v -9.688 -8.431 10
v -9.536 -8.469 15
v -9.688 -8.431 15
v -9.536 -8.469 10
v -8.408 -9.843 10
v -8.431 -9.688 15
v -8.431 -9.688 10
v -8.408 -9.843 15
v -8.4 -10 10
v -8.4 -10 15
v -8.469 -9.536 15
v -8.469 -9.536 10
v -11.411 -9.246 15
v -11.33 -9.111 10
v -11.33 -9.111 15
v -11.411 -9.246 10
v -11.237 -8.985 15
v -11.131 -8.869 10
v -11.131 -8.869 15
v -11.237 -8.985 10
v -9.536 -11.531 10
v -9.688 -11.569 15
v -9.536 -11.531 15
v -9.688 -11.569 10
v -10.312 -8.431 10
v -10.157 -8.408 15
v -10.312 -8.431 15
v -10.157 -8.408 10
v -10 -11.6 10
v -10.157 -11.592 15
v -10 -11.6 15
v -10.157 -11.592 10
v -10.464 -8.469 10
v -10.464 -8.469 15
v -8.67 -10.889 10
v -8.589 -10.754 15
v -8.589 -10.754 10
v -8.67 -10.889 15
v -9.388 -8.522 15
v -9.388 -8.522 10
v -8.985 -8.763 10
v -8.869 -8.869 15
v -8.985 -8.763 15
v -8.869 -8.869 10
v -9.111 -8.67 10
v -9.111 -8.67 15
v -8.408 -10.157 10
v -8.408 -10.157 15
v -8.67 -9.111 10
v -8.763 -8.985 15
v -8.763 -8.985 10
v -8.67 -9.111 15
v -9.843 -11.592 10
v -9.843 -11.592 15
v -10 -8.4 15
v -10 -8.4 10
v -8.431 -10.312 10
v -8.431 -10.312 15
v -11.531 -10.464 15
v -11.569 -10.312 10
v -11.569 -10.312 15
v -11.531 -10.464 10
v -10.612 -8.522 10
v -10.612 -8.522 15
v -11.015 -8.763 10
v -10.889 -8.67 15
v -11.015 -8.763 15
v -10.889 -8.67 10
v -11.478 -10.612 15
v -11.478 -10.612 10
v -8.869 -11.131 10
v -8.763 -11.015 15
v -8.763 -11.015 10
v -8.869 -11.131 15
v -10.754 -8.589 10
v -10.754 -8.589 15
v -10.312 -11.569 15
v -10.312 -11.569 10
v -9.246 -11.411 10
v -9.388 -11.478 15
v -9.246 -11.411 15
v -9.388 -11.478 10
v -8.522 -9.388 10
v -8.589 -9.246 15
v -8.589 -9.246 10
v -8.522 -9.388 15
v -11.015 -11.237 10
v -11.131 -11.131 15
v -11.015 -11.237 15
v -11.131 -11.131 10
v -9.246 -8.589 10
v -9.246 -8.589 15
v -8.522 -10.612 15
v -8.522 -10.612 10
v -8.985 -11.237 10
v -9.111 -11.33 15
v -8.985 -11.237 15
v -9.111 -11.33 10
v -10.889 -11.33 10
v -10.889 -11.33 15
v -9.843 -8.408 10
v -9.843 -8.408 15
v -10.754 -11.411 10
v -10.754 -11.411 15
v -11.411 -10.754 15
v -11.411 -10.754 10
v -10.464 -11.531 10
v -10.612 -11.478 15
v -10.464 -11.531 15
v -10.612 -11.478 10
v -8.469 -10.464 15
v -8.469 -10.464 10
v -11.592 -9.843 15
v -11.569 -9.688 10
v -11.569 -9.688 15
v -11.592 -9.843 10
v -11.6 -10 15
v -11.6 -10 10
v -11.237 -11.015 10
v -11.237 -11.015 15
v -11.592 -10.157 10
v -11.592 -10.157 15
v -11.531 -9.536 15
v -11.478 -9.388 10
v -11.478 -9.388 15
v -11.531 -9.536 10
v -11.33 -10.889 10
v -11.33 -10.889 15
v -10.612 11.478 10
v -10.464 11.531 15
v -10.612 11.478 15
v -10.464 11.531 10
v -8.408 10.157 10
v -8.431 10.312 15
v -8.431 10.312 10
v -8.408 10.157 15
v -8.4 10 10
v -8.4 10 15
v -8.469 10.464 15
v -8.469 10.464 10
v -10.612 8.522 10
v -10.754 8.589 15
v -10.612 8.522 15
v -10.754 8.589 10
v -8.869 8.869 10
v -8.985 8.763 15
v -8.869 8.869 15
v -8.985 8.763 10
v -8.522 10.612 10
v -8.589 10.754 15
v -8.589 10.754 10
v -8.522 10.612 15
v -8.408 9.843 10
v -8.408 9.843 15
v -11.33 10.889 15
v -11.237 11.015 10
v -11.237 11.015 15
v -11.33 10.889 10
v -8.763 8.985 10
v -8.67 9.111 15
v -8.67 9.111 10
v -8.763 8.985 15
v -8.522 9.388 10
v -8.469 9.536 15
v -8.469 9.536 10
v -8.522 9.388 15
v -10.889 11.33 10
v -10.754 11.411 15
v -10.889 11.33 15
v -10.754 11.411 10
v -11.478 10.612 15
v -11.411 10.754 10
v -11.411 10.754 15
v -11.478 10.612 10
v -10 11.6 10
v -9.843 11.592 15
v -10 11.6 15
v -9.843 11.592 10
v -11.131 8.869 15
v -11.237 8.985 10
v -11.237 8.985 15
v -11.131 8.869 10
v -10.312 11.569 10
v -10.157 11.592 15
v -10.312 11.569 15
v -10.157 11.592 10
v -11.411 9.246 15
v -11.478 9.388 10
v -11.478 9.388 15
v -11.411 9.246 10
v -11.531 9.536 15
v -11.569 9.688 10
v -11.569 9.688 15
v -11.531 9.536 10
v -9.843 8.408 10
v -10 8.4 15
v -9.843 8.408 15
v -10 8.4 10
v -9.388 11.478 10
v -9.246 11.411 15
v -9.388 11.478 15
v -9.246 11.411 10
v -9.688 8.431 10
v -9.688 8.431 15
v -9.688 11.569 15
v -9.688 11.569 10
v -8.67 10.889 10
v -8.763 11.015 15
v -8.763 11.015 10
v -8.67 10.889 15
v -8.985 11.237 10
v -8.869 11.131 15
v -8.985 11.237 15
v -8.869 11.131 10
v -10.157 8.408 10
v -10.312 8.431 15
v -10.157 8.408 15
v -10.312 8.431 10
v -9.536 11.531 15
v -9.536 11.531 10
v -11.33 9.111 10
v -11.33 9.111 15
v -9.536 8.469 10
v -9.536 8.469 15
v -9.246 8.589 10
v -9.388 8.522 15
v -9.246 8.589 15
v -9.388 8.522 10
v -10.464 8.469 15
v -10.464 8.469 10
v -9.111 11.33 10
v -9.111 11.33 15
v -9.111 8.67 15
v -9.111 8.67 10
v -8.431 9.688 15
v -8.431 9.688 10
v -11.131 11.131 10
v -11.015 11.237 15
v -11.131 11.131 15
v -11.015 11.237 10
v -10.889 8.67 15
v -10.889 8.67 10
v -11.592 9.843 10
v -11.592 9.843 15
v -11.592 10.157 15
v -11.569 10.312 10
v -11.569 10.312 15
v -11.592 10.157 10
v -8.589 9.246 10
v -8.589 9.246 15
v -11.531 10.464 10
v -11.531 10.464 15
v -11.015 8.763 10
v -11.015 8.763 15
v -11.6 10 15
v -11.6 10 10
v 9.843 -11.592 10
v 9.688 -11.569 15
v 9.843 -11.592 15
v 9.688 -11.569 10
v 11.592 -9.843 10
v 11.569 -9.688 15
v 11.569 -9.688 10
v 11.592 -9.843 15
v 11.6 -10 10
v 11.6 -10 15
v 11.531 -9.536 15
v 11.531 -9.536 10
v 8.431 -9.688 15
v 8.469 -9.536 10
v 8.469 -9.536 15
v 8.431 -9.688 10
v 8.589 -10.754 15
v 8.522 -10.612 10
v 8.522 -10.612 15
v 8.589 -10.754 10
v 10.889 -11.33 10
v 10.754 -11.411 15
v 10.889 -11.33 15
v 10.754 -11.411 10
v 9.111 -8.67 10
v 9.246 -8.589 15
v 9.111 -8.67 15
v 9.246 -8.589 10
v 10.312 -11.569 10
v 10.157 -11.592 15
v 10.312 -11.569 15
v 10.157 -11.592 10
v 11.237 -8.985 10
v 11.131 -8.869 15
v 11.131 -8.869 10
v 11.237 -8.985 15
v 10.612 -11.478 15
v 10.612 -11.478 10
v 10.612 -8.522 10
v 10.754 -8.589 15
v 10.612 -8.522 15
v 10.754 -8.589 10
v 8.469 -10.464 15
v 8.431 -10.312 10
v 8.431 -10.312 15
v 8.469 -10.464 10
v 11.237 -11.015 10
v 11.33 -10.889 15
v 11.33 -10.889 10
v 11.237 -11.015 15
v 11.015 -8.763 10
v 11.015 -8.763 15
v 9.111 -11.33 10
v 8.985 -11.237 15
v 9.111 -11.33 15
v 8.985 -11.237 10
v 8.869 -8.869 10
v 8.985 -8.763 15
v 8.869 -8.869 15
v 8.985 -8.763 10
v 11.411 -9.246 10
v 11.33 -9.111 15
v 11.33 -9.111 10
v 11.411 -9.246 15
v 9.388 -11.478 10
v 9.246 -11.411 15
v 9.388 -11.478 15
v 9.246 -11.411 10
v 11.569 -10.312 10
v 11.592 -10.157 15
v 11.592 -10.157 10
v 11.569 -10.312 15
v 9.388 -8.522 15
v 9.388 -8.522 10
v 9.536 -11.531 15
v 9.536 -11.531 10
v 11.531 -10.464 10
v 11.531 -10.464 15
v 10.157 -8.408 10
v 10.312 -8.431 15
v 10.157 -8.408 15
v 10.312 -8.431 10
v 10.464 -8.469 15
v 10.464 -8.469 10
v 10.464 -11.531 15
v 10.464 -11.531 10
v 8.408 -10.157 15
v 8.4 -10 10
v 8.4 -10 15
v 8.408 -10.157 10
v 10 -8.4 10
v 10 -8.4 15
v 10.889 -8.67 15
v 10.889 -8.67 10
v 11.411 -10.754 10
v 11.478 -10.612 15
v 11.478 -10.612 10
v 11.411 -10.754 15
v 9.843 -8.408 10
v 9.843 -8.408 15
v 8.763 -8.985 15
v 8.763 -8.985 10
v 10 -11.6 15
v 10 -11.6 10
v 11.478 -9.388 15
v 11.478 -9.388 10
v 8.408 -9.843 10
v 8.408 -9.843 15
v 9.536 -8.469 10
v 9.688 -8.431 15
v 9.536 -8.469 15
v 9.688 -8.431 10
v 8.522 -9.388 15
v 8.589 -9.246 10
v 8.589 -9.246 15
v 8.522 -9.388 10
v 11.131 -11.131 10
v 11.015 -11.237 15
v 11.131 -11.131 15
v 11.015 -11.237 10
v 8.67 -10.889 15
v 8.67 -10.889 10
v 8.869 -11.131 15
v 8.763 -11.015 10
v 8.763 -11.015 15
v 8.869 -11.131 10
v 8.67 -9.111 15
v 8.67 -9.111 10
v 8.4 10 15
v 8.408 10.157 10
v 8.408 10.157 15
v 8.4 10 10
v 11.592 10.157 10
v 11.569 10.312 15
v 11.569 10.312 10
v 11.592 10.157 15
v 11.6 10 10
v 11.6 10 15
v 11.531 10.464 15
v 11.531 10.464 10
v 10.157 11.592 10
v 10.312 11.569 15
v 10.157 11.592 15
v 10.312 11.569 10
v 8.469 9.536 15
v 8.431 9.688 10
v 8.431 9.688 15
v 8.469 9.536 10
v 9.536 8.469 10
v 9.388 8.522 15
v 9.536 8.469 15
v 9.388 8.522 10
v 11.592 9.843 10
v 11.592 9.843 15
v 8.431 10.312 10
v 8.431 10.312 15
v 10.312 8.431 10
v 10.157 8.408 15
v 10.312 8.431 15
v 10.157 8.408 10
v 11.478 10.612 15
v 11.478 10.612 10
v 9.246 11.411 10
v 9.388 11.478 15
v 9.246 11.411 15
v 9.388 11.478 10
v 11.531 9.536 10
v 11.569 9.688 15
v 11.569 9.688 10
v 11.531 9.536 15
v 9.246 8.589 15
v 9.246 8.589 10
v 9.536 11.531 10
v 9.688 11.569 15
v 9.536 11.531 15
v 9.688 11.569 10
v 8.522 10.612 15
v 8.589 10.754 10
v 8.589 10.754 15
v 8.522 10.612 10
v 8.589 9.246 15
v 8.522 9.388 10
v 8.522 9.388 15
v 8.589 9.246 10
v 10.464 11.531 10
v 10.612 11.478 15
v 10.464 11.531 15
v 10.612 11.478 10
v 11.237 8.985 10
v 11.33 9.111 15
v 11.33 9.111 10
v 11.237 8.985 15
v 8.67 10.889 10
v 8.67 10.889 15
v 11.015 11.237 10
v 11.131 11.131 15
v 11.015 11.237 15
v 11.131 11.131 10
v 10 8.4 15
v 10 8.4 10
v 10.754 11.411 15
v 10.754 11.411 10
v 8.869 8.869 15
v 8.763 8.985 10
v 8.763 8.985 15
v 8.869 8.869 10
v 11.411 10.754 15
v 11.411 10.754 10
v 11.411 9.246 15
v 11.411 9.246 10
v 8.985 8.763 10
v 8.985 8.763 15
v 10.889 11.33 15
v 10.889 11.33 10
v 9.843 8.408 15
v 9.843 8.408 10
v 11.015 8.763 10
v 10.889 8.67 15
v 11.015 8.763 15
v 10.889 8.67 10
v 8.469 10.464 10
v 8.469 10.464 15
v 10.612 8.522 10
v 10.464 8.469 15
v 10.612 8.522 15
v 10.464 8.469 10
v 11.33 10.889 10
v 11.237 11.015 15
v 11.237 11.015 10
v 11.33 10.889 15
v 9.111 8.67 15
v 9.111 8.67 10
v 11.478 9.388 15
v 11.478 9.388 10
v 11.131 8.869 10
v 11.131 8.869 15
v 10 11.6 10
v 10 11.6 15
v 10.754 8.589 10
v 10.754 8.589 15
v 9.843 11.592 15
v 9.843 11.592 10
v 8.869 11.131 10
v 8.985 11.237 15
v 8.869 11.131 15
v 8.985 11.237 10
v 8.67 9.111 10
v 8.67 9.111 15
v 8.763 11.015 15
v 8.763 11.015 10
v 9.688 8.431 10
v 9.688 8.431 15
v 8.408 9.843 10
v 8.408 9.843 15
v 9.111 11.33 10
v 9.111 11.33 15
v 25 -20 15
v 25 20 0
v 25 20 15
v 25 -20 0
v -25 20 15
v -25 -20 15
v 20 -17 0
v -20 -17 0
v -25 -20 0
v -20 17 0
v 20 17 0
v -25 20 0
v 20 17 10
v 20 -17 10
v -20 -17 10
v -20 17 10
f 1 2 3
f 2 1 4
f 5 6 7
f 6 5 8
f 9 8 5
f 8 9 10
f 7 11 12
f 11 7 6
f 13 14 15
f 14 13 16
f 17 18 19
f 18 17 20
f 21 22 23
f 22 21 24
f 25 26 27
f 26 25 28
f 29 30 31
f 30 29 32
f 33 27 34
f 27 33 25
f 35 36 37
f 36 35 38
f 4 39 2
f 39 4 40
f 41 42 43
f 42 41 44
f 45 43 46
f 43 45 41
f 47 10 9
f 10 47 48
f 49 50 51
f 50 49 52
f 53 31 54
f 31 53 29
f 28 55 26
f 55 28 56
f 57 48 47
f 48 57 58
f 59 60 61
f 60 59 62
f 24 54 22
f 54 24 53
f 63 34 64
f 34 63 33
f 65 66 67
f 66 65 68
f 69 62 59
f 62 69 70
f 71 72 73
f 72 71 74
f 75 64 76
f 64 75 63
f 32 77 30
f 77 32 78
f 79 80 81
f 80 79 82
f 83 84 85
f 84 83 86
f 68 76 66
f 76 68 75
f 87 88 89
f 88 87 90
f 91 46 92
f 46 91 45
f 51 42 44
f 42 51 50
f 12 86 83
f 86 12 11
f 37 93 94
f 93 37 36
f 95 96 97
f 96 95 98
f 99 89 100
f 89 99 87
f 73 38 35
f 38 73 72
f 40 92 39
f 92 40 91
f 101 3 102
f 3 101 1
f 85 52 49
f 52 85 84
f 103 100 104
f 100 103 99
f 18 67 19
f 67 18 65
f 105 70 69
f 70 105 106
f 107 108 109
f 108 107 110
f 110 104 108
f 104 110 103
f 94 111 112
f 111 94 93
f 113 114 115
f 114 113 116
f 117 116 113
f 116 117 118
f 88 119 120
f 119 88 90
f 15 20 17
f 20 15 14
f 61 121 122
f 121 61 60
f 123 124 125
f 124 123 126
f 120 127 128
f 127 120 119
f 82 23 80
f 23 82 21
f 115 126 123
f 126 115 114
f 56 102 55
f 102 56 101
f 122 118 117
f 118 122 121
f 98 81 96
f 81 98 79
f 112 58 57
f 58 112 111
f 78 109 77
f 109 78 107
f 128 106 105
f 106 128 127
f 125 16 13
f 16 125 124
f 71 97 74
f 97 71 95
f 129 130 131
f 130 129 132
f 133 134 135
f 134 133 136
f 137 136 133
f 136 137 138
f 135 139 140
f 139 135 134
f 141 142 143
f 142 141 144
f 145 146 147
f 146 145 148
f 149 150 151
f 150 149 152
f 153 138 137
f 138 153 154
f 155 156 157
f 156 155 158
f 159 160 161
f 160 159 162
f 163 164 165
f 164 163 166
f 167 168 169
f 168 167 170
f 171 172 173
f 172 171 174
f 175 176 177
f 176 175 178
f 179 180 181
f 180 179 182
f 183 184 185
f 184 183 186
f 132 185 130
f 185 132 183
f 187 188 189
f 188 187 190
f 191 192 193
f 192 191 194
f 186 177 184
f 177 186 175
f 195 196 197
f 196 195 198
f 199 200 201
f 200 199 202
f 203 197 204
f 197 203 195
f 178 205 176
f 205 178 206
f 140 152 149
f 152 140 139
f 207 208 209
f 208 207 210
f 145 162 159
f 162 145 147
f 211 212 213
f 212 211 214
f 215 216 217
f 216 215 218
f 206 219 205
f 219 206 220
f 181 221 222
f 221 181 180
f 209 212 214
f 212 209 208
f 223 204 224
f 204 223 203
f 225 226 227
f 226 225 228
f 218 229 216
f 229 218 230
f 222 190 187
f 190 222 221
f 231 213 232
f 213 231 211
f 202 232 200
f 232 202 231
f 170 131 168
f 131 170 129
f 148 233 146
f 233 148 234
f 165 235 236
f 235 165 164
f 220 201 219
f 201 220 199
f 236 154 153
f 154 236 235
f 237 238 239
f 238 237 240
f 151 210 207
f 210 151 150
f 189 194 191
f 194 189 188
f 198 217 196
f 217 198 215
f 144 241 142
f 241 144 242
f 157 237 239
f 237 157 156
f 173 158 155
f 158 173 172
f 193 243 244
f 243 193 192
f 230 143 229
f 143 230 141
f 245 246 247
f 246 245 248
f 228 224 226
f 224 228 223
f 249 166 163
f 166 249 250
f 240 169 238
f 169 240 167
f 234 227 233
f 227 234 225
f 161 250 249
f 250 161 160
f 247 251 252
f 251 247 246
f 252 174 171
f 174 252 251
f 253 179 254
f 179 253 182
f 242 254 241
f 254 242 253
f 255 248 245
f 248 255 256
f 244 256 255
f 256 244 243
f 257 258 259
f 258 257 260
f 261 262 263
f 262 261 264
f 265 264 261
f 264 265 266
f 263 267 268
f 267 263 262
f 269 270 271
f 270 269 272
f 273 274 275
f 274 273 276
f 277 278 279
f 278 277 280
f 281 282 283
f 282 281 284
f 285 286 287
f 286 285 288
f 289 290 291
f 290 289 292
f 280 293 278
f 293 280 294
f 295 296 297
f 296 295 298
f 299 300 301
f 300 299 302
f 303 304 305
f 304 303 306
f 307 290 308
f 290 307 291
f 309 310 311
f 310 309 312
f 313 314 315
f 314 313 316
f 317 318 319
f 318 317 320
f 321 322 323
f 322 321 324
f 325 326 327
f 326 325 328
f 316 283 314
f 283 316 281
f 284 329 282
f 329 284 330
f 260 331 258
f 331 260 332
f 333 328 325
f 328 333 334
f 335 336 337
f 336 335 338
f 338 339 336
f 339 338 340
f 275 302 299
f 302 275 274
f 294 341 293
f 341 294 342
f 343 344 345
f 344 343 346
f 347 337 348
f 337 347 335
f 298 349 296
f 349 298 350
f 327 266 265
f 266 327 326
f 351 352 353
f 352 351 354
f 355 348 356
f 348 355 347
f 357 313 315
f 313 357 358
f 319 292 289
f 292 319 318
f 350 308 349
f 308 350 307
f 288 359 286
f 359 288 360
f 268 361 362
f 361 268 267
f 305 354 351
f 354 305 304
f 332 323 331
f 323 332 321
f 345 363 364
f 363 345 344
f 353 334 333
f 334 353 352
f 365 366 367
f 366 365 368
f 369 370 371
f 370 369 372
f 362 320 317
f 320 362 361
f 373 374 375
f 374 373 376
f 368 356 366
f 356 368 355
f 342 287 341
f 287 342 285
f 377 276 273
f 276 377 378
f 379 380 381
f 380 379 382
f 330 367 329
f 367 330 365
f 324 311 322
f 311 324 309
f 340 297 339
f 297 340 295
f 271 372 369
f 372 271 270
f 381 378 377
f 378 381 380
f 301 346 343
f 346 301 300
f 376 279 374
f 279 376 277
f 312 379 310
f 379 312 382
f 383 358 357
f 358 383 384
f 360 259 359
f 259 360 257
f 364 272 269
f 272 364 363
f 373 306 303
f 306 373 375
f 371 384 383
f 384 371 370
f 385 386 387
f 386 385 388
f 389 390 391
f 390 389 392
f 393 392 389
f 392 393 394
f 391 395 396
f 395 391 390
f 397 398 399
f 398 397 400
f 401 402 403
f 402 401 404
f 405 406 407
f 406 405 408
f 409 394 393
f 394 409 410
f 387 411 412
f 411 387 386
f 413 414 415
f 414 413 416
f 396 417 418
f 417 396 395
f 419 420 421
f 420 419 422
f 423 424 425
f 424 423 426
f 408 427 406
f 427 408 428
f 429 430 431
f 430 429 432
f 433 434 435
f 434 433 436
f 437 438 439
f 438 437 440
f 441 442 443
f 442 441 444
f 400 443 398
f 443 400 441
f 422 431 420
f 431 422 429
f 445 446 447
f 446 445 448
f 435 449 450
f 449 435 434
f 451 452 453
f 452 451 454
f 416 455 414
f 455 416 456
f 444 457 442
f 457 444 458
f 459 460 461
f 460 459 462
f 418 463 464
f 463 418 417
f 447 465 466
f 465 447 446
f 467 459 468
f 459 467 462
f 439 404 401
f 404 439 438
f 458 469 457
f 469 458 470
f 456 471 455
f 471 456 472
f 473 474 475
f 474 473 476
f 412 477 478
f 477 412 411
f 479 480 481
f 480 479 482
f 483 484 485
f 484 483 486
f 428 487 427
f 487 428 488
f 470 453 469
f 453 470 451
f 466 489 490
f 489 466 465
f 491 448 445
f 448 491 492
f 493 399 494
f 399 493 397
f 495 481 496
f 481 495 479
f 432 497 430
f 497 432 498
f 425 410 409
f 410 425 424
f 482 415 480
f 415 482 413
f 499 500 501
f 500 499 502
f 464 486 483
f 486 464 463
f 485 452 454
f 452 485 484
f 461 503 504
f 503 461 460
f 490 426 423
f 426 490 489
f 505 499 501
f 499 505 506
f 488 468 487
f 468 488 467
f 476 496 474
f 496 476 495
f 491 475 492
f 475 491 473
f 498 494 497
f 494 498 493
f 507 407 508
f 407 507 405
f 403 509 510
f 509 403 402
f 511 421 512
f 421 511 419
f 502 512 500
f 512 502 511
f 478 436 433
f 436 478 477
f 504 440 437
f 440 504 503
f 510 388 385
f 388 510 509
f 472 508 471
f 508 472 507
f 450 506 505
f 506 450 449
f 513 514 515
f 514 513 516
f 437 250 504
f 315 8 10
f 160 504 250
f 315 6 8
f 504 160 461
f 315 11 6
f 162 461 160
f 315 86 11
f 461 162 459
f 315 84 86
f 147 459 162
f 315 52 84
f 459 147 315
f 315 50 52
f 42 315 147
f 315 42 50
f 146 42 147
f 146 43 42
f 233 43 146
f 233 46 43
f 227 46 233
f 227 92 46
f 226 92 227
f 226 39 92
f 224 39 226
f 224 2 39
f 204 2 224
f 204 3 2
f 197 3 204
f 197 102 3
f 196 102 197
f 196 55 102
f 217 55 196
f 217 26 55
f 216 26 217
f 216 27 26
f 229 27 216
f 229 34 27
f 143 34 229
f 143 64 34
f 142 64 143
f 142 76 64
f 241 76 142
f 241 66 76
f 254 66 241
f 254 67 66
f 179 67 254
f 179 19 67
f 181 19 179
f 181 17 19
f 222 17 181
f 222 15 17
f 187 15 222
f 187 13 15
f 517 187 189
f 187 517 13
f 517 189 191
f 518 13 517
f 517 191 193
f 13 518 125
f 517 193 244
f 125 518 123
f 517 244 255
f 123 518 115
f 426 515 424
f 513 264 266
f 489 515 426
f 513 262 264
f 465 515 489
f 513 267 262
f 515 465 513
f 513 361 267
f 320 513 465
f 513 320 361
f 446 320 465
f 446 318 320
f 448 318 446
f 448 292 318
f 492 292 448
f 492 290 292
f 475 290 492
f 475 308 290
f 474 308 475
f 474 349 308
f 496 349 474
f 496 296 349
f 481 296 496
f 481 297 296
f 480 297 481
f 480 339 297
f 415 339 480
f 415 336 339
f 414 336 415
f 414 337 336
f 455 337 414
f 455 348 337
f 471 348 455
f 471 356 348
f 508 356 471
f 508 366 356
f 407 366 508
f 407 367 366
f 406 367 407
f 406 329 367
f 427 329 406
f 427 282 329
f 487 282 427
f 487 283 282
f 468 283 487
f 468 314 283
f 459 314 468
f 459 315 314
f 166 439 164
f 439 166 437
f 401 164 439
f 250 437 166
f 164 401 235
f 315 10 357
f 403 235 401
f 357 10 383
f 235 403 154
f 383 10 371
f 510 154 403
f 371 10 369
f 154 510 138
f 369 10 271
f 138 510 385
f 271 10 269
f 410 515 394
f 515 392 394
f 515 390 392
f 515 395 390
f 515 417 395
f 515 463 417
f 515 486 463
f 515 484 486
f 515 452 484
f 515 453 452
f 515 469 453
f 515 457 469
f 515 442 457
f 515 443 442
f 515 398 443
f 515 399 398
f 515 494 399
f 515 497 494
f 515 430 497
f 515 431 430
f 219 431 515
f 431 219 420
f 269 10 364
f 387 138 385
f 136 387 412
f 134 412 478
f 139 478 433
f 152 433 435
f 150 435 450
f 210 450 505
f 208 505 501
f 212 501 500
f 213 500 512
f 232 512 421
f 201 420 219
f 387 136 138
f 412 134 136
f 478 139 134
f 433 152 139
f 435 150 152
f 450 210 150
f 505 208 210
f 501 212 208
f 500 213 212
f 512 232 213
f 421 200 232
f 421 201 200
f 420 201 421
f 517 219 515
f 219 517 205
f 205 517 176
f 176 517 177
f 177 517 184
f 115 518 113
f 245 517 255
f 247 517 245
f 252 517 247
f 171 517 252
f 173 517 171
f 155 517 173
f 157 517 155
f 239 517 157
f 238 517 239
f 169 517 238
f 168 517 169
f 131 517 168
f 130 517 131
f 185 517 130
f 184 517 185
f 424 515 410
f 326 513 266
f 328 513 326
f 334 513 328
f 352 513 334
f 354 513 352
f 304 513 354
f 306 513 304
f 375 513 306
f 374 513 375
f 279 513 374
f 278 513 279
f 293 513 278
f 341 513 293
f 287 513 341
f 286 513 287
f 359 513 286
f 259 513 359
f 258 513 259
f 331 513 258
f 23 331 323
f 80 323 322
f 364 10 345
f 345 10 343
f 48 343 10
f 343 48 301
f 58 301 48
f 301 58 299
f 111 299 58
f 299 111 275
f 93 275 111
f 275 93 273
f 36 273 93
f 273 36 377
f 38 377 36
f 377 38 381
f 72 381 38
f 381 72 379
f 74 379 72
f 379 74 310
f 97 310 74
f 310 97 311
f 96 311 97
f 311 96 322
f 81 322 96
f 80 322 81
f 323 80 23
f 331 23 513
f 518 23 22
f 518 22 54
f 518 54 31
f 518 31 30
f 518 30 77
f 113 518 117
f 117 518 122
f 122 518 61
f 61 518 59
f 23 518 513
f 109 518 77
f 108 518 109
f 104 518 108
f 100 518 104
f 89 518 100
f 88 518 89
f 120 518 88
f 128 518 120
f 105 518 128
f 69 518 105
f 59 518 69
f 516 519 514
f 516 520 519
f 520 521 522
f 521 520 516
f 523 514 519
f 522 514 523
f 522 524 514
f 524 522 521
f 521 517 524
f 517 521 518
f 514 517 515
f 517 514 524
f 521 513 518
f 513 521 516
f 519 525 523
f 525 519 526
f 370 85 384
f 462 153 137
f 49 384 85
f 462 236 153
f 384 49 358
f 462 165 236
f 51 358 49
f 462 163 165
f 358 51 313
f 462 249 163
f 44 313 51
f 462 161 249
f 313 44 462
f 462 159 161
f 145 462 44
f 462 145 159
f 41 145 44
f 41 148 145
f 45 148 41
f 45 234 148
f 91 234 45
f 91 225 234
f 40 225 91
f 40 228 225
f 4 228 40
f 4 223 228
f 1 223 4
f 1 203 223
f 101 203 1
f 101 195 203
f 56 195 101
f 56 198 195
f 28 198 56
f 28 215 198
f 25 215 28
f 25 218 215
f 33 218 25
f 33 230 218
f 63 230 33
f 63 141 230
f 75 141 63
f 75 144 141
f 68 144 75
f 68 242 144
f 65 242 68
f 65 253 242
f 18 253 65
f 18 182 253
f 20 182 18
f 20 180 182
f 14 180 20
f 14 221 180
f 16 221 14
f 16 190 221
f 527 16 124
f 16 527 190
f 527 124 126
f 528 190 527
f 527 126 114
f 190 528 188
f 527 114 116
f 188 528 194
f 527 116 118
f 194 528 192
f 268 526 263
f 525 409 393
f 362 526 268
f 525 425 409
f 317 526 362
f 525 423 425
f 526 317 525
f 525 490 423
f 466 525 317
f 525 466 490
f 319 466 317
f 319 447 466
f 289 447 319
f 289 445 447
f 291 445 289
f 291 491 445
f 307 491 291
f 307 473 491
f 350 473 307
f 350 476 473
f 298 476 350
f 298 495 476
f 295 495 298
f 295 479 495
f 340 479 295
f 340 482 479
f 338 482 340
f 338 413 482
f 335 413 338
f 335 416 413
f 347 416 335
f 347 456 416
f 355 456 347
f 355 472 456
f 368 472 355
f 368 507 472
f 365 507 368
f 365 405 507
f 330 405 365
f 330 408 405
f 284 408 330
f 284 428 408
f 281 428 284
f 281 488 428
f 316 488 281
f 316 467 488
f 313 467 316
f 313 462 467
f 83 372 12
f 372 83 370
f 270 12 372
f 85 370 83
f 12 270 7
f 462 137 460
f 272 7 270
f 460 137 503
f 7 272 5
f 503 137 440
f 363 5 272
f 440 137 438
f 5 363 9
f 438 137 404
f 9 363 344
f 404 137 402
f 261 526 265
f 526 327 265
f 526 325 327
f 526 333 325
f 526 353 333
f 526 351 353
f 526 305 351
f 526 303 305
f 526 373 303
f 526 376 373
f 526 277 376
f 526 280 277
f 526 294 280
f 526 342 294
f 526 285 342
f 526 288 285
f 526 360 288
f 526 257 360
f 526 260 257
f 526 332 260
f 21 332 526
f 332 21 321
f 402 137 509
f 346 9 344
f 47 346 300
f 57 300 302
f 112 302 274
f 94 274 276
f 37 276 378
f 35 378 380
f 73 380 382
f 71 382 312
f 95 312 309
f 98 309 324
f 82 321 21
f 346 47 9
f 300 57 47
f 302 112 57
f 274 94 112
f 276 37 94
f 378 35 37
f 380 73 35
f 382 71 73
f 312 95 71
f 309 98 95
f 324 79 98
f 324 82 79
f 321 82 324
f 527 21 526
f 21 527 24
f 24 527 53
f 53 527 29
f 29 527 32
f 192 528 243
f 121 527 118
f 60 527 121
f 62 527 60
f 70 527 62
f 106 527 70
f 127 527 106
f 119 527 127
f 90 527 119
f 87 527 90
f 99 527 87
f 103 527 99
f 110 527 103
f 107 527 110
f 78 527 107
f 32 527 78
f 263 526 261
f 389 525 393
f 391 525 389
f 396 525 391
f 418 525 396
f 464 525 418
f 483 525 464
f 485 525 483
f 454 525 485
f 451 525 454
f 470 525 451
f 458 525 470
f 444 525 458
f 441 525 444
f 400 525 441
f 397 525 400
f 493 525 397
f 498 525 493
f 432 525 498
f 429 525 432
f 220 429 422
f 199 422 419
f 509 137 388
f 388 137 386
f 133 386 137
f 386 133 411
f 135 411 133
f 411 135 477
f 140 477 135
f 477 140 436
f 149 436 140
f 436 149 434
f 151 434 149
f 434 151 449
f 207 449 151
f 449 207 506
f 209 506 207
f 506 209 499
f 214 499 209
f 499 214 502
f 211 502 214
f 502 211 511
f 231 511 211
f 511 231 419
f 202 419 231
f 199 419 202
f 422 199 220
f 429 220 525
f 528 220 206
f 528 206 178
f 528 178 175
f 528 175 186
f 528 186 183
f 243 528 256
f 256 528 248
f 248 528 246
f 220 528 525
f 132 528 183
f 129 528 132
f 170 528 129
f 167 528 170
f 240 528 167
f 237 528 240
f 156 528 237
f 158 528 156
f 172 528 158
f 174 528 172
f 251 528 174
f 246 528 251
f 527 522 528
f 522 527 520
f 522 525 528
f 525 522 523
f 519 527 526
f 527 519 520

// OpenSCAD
// MGN12H carriage dimensions
carriage_length = 40;
carriage_width = 34;
carriage_height = 10;

// Mounting block dimensions
block_length = 50;
block_width = 40;
block_height = 15;

// M3 bolt hole dimensions
bolt_hole_diameter = 3.2;
bolt_hole_spacing_x = 20;
bolt_hole_spacing_y = 20;

// Create the mounting block
difference() {
    // Main block
    translate([-block_length/2, -block_width/2, 0])
        cube([block_length, block_width, block_height]);

    // Cut out space for the carriage
    translate([-carriage_length/2, -carriage_width/2, 0])
        cube([carriage_length, carriage_width, carriage_height]);

    // Bolt holes
    for (x = [-bolt_hole_spacing_x/2, bolt_hole_spacing_x/2])
        for (y = [-bolt_hole_spacing_y/2, bolt_hole_spacing_y/2])
            translate([x, y, -1])
                cylinder(h = block_height + 2, d = bolt_hole_diameter, $fn = 64);
}
